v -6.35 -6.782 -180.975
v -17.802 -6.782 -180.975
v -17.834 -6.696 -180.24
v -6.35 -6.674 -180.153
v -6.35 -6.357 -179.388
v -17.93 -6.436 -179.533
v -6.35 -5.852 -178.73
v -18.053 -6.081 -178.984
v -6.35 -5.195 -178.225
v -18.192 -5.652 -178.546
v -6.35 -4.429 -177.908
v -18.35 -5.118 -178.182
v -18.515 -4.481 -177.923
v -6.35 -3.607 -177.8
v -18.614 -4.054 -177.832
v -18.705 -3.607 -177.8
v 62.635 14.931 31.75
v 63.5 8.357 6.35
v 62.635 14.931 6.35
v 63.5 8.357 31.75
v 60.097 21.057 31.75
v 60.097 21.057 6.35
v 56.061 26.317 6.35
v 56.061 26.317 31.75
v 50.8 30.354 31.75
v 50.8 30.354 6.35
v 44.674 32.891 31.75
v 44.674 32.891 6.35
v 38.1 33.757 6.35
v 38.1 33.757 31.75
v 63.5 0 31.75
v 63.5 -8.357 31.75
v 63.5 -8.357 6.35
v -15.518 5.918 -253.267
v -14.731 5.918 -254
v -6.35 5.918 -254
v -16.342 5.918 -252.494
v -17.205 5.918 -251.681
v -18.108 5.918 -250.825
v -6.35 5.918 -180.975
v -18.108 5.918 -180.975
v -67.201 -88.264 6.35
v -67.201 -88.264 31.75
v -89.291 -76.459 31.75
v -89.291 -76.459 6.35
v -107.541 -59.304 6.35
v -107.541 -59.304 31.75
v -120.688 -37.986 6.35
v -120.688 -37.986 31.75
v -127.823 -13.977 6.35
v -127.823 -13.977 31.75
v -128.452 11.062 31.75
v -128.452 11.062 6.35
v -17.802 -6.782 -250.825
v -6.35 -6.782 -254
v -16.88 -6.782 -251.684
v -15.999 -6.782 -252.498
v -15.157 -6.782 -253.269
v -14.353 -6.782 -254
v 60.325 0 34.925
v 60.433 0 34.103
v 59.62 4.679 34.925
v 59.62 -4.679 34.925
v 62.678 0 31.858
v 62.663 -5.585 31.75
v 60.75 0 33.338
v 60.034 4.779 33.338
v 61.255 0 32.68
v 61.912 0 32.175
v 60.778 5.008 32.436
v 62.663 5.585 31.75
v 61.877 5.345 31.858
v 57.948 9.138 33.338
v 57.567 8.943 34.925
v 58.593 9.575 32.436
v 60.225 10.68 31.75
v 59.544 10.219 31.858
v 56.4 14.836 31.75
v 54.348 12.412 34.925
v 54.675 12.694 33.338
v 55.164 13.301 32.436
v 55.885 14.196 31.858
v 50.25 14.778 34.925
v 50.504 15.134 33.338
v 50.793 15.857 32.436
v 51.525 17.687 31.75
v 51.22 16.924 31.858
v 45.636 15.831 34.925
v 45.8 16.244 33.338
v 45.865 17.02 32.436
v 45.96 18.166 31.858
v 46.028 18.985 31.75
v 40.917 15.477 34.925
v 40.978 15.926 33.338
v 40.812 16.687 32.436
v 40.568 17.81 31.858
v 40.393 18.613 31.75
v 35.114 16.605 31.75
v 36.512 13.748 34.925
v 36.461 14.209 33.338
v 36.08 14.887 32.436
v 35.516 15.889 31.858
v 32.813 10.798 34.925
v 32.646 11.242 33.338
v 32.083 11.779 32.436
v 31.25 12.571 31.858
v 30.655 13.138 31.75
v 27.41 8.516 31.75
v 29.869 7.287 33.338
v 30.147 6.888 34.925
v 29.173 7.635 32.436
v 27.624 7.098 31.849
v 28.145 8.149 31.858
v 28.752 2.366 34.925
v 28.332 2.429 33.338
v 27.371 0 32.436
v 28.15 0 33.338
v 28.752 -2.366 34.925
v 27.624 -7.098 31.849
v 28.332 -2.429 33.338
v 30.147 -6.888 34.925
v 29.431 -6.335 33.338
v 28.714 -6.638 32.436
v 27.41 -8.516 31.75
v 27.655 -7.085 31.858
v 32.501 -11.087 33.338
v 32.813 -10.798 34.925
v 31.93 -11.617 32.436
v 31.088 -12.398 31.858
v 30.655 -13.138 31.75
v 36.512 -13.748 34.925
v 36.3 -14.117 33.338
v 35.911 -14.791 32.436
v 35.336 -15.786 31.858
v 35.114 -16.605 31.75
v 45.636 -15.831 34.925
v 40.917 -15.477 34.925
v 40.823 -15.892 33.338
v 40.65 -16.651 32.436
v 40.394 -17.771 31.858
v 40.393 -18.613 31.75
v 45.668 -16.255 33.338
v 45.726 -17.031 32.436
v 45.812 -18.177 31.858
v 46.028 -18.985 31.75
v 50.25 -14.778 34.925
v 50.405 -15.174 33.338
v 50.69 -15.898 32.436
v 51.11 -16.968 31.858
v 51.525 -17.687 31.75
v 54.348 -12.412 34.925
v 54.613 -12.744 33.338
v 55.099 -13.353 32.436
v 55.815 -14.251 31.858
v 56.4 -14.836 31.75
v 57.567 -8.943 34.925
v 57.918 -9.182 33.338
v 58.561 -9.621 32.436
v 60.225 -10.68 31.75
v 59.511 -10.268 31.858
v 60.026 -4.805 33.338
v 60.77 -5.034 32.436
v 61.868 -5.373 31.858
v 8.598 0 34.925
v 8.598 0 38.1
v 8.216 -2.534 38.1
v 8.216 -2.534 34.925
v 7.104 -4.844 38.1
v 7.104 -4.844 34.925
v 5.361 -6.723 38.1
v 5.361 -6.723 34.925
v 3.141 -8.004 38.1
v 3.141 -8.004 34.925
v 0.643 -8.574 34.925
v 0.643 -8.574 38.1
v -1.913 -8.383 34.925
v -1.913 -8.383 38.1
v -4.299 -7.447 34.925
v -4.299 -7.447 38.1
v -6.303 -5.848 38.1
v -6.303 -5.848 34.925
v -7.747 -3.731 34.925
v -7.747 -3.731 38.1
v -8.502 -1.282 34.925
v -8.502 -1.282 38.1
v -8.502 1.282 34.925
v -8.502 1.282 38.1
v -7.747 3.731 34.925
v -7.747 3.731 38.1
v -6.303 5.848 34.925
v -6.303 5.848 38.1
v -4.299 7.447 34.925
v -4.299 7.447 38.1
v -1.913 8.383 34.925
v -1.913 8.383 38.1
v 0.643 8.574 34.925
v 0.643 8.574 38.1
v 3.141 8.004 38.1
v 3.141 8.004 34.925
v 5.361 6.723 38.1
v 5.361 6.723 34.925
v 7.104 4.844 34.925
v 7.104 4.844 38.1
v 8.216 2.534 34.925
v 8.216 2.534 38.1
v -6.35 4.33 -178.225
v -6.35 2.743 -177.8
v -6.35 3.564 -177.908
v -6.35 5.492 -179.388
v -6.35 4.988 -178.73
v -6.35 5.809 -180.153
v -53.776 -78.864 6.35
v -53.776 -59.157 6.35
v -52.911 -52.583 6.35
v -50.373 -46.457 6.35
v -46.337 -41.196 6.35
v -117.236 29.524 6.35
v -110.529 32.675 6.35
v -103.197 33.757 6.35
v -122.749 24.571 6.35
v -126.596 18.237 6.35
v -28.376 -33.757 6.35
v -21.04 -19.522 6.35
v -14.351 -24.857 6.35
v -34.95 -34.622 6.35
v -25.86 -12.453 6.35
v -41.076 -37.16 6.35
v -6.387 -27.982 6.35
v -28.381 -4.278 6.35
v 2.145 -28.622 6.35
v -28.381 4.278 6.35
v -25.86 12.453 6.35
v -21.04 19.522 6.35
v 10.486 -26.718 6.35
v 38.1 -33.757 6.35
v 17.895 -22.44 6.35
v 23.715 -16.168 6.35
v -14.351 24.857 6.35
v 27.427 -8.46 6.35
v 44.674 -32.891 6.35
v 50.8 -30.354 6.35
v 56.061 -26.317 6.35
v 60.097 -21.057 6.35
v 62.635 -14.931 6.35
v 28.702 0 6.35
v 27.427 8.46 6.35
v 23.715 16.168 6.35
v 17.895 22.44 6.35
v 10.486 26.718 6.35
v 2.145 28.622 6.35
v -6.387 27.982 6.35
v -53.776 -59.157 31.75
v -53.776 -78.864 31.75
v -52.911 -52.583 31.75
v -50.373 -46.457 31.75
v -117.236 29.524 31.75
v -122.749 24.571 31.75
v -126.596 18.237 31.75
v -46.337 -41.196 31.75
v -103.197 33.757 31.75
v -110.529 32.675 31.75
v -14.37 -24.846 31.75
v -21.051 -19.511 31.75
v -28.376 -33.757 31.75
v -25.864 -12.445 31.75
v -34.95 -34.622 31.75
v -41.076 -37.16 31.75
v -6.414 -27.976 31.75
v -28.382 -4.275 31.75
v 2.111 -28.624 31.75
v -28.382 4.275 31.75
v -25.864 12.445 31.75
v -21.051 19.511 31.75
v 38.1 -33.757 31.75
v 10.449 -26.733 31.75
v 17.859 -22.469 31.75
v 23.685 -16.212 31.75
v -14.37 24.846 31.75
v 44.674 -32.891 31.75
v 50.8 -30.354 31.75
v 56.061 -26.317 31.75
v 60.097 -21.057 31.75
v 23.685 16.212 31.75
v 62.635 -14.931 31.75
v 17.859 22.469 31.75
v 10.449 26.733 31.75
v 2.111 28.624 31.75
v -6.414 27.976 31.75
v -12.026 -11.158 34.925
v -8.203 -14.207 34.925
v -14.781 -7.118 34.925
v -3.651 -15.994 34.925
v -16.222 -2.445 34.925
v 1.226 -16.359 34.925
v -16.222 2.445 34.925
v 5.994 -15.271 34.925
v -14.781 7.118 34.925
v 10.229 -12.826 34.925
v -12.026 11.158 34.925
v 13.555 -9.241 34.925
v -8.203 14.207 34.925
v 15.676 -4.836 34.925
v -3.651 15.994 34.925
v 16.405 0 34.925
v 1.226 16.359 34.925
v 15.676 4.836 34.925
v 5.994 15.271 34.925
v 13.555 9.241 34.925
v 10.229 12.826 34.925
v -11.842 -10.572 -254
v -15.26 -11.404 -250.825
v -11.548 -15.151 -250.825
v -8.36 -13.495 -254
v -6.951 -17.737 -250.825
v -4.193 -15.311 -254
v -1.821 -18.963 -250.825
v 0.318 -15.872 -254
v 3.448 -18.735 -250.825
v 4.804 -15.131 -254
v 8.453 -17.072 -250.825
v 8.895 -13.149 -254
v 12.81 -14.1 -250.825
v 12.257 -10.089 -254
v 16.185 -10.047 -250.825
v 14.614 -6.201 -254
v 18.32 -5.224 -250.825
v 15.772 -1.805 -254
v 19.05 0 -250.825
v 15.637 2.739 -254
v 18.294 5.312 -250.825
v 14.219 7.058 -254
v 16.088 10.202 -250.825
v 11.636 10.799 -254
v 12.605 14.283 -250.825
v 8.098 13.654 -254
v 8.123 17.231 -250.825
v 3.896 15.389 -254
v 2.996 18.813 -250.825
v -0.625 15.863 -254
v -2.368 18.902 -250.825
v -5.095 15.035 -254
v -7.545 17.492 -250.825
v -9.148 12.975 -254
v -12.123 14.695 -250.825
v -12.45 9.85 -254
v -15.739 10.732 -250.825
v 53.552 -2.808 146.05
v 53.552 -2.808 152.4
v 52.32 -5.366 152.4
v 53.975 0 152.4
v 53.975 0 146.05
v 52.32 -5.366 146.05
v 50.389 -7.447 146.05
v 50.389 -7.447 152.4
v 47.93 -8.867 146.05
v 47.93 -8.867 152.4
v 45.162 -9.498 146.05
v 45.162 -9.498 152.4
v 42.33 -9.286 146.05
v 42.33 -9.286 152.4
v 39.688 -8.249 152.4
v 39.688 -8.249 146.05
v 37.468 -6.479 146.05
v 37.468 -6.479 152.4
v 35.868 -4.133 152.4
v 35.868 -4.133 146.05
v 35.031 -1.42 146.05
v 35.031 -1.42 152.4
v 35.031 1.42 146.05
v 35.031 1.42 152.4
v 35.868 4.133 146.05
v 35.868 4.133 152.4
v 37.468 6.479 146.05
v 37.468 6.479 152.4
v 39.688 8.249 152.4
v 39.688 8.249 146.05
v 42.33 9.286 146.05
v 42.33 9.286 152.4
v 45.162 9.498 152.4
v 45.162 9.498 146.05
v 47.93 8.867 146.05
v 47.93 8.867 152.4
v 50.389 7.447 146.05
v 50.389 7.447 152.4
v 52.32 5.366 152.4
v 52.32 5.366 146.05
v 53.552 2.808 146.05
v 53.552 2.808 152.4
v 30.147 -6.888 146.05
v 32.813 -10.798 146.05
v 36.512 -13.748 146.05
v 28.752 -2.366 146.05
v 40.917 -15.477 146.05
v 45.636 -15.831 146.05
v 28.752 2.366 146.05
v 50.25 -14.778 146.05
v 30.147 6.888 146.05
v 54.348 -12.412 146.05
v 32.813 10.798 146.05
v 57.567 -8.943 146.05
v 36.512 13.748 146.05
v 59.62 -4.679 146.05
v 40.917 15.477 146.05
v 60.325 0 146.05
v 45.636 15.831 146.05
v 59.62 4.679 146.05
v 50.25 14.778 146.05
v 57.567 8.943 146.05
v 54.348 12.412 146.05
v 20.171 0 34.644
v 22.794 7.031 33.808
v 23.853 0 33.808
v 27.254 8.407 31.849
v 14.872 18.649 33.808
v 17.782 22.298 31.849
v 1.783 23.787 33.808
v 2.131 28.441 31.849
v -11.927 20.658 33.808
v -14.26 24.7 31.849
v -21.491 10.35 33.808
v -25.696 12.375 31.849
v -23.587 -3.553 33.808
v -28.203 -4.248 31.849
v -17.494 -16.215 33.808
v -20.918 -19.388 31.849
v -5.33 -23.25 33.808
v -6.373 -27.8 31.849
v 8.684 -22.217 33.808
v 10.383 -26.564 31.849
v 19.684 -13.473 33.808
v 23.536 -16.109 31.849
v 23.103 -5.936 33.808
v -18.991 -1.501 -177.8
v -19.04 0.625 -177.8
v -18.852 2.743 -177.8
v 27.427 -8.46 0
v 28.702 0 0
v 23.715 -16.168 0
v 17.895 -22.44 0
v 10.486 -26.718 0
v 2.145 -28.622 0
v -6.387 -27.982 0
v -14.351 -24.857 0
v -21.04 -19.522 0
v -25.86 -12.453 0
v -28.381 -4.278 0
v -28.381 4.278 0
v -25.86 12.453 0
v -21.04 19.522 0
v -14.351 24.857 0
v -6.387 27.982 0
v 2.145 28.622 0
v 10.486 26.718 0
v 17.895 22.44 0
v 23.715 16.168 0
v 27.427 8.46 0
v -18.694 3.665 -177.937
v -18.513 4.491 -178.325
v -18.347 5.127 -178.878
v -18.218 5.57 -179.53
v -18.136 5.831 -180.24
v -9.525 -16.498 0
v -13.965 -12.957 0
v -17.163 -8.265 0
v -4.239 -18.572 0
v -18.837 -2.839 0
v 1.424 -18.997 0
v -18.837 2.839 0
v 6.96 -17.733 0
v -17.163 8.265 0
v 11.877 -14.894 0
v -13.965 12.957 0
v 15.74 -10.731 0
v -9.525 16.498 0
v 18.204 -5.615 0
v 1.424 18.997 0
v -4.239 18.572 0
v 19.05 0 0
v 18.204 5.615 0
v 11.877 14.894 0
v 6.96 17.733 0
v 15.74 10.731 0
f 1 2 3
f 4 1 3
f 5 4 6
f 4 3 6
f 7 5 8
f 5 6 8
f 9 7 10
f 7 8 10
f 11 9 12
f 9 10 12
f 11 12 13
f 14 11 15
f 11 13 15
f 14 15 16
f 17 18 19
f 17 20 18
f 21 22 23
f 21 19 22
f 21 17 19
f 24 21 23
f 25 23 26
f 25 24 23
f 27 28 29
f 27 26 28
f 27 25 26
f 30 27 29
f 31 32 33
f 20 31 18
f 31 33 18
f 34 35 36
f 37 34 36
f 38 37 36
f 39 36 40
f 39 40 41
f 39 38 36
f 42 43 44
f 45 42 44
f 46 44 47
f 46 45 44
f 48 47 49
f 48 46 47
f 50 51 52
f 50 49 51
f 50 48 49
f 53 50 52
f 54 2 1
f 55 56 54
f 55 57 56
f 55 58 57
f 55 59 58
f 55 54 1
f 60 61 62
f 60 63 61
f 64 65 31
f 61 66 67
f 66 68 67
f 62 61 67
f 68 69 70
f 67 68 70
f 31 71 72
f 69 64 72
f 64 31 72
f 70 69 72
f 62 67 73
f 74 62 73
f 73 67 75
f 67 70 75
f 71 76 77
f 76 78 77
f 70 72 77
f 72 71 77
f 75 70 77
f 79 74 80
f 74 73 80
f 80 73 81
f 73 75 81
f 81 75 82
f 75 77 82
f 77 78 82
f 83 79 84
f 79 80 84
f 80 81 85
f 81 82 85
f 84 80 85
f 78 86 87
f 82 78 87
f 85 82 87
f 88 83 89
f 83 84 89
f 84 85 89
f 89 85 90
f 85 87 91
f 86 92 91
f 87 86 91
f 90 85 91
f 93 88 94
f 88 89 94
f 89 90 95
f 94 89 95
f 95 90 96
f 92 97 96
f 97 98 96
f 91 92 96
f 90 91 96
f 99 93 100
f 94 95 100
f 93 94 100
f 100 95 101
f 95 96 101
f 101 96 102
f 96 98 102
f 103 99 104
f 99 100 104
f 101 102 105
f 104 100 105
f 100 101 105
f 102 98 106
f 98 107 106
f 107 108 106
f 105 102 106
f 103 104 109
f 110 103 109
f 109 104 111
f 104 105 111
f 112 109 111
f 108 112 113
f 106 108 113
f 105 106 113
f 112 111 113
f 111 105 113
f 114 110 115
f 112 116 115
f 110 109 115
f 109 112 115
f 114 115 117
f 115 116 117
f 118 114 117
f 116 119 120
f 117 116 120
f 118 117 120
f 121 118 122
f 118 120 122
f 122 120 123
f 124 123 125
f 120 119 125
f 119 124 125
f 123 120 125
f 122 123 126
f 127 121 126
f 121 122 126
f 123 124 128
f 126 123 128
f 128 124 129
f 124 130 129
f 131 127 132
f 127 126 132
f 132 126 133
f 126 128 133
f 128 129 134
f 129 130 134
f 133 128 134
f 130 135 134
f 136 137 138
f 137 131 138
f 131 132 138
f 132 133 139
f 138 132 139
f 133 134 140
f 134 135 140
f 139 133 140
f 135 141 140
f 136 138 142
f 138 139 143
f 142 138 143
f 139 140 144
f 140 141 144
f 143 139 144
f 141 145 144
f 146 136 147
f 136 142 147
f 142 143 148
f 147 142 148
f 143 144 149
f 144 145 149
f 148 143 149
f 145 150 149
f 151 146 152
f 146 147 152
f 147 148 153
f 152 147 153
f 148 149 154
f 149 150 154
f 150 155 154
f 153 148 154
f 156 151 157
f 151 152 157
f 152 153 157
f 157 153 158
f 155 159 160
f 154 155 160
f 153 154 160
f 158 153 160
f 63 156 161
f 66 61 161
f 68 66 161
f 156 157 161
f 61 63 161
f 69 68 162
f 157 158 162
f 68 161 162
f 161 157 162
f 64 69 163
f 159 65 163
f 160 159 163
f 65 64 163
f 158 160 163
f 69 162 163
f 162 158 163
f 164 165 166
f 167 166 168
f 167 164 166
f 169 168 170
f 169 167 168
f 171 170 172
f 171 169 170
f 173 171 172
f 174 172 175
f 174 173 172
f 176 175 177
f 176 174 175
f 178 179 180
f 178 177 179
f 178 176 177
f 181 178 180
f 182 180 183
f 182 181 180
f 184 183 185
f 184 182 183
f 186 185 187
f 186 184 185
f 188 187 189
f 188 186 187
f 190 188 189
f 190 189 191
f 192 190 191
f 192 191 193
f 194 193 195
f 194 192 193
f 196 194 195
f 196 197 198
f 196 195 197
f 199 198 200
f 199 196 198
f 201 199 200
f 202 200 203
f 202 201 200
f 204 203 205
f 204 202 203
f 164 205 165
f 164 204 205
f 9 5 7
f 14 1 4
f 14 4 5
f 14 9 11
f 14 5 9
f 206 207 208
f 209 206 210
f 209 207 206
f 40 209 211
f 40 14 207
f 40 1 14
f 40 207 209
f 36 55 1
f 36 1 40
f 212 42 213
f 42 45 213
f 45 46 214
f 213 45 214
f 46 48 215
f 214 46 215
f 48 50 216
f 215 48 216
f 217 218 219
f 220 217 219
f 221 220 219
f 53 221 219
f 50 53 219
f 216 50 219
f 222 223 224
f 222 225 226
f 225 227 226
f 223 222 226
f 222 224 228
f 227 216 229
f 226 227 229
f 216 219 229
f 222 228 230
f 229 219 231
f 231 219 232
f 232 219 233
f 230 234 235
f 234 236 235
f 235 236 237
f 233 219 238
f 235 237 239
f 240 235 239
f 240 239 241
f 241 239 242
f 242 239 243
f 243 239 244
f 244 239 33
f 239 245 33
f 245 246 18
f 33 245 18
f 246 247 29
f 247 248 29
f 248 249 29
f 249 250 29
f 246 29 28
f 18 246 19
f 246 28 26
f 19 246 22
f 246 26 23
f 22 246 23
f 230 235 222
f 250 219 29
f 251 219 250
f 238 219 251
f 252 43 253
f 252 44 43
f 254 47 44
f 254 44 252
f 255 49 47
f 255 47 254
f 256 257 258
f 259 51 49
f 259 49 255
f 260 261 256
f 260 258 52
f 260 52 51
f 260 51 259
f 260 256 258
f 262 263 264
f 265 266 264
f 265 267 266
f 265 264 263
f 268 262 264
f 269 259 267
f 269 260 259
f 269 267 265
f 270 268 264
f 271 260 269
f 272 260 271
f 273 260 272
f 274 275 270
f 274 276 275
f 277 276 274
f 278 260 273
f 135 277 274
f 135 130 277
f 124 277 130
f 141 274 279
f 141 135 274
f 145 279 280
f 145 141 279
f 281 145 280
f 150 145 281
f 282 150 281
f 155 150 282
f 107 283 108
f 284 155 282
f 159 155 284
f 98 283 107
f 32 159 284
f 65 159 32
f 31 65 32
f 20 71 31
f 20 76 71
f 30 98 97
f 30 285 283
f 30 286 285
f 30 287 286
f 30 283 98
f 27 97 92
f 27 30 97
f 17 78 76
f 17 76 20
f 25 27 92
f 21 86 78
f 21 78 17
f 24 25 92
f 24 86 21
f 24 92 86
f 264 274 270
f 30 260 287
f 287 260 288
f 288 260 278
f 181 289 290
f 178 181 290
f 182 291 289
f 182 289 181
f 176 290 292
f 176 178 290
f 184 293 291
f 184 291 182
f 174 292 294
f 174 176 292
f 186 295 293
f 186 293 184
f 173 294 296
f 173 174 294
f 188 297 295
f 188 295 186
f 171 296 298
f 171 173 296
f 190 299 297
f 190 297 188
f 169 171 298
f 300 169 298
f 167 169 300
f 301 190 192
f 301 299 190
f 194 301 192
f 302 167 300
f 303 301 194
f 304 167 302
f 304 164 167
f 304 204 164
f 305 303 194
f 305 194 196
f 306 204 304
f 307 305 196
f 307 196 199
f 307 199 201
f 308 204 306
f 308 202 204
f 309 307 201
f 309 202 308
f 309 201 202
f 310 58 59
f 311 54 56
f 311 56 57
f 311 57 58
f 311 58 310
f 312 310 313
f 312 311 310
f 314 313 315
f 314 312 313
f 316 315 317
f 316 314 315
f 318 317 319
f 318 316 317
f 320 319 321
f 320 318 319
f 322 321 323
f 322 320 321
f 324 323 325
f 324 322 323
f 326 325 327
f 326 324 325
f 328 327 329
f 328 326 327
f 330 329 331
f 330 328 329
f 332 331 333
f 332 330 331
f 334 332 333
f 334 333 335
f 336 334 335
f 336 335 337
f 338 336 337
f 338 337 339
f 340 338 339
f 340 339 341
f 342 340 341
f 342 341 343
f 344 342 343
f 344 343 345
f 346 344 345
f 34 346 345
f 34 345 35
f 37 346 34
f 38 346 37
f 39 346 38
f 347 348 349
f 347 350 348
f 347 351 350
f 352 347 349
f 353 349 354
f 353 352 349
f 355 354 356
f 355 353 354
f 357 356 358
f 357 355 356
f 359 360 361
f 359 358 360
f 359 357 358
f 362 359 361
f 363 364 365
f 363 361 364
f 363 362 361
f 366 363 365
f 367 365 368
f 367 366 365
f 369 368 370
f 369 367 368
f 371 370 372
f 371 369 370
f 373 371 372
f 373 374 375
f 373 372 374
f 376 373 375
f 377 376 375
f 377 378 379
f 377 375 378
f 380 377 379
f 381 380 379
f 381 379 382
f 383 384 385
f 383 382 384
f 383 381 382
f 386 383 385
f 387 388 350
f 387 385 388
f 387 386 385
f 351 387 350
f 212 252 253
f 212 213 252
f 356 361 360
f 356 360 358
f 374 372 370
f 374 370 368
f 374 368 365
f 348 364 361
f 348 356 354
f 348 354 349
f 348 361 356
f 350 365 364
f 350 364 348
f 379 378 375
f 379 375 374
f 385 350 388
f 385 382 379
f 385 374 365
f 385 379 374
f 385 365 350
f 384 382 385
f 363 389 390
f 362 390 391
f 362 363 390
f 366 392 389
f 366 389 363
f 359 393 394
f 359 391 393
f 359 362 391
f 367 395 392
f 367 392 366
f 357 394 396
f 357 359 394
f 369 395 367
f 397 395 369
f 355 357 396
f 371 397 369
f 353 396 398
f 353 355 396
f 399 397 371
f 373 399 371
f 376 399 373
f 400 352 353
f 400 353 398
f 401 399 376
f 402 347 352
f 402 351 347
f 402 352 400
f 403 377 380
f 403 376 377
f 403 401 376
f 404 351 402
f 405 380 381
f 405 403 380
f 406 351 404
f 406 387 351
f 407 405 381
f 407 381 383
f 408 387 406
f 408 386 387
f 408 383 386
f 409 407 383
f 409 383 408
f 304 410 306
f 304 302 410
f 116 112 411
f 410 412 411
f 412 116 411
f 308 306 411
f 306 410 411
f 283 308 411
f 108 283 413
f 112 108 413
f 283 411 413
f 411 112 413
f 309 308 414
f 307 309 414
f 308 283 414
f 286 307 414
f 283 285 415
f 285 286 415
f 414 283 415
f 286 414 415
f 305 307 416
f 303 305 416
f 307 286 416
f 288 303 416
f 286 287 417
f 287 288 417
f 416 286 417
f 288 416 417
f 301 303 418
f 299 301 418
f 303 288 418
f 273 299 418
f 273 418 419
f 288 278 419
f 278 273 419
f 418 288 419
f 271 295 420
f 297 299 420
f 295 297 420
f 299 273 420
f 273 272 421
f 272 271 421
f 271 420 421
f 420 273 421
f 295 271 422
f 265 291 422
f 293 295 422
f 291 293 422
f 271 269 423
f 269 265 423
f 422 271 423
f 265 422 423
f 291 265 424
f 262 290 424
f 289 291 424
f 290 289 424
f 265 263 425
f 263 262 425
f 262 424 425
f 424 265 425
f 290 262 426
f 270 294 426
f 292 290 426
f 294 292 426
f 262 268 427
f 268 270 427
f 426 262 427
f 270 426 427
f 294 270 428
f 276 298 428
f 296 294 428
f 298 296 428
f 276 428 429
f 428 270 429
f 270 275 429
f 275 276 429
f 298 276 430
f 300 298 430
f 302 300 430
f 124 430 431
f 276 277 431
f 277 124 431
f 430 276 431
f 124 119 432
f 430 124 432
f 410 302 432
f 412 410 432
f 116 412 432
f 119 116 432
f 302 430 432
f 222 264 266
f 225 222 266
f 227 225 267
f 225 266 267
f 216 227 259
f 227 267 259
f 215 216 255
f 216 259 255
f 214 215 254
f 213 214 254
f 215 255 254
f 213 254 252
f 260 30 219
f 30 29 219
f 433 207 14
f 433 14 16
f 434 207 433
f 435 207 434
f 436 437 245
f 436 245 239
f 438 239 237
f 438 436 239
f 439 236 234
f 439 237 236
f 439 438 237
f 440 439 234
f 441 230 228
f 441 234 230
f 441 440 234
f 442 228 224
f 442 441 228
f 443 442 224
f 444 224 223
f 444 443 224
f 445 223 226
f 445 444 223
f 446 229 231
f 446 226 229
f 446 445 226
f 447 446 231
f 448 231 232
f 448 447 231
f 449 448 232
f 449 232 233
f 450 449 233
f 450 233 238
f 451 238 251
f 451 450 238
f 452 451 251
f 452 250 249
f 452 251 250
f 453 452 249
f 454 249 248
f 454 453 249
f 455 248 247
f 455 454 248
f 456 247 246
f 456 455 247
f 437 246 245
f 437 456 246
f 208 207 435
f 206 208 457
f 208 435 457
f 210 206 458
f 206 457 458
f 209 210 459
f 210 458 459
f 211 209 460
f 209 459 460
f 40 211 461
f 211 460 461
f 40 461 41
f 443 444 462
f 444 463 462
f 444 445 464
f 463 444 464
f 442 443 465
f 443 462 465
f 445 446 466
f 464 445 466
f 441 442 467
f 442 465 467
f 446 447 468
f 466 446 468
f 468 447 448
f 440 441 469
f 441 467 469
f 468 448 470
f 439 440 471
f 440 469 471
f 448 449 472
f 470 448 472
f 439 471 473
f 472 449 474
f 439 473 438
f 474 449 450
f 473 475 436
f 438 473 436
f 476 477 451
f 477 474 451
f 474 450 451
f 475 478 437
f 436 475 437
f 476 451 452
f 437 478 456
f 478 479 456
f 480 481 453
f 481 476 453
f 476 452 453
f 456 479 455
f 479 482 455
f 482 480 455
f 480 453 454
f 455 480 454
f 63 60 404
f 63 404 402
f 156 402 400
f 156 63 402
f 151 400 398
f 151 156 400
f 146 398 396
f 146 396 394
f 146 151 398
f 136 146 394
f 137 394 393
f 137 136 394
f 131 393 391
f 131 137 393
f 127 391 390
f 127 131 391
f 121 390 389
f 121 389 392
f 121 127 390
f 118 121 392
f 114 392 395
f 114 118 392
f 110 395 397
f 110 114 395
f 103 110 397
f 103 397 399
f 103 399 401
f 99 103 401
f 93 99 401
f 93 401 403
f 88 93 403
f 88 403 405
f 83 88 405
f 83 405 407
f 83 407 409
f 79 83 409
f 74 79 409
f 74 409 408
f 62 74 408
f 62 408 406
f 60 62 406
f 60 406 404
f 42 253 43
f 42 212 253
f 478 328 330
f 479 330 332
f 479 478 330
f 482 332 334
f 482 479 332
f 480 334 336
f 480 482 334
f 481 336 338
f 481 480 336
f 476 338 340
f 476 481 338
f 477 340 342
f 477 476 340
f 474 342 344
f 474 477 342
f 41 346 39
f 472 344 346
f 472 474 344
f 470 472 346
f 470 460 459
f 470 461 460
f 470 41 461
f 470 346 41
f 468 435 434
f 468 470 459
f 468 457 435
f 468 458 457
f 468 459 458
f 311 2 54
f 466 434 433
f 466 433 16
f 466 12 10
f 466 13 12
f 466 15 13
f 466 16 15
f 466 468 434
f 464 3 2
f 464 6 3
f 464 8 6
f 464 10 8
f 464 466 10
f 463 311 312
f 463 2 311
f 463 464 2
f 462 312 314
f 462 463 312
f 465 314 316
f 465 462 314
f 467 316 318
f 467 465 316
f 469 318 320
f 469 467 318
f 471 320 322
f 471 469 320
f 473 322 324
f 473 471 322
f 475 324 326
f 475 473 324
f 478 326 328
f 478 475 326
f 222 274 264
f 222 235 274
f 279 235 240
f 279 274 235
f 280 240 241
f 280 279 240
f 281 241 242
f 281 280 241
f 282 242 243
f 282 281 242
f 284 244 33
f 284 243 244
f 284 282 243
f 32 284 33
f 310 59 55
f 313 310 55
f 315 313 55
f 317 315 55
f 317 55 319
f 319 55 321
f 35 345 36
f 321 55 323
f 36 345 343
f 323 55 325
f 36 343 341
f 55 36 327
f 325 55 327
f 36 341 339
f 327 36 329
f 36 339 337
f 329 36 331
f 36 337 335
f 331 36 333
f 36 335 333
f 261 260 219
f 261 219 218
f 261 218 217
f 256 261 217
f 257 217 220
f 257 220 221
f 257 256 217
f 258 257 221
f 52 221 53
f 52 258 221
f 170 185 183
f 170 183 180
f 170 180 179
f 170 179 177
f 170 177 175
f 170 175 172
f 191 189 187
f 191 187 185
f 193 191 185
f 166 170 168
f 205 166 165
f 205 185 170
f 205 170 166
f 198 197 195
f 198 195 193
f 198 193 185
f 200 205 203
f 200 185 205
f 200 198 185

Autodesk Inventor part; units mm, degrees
ref_plane "YZ Plane" through (0, 0, 0) normal (1, 0, 0) x (0, 1, 0)
ref_plane "XZ Plane" through (0, 0, 0) normal (0, 1, 0) x (-1, 0, 0)
ref_plane "XY Plane" through (0, 0, 0) normal (0, 0, 1) x (1, 0, 0)
sketch "Sketch1" plane through (0, 0, 0) normal (0, 0, 1) x (1, 0, 0)
  circle A0 centre (0, 0) radius 19.05
  circle A1 centre (0, 0) radius 28.702
  dimension "d1" = 9.652
  dimension "d38" = 38.1
extrude "Extrusion1" add sketch "Sketch1" against normal blind 254 contours A0
extrude "Extrusion2" add sketch "Sketch1" along normal blind 6.35 contours A0 | A1
chamfer "Chamfer1" distance 3.175 angle 45 1 edges at (-19.05, 0, -254)
sketch "Sketch2" plane through (0, 0, 6.35) normal (0, 0, 1) x (1, 0, 0)
  circle A0 centre (0, 0) radius 28.702 projected
  circle A1 centre (0, 0) radius 33.7566
  arc A2 (-68.8892, 89.446) -> (-67.2009, -88.2638) centre (-33.7441, 0.9169) ccw
  line L0 (-53.7761, -78.8636) -> (-67.2009, -88.2638)
  line L1 (0, -33.7566) -> (0, 33.7566)
  line L2 (-53.7761, 78.8636) -> (-53.7761, -78.8636)
  line L3 (-53.7761, 78.8636) -> (-68.8892, 89.446)
  line L4 (63.5, 33.7566) -> (-53.7761, 33.7566)
  line L5 (0, 0) -> (-53.7761, 0)
  line L6 (-146.05, 0) -> (-154.4505, 0)
  line L7 (63.5, -33.7566) -> (-53.7761, -33.7566)
  line L8 (0, 0) -> (63.5, 0)
  line L9 (63.5, 0) -> (63.5, -33.7566)
  line L10 (63.5, 0) -> (63.5, 33.7566)
  line L11 (-53.7761, 33.7566) -> (-123.154, 33.7566)
  line L12 (-53.7761, 0) -> (-128.9897, 0)
  line L13 (-53.7761, -33.7566) -> (-122.4589, -33.7566)
  dimension "d8" = 125
  dimension "d10" = 190.5
  dimension "d17" = 63.5
extrude "Extrusion10" add sketch "Sketch2" along normal blind 25.4 contours L8 L1 A0 | L8 A1 L1 A0 | A0 L1 L8 | A0 L1 A1 L8 | L1 L5 A0 | A0 L5 A1 L1 | L1 A1 L5 A0 | A0 L5 L1 | L8 L9 L7 A1 | A1 L4 L10 L8 | A1 L5 L2 L4 | L7 L2 L5 A1 | L2 L12 A2 L11 | L13 A2 L12 L2 | L2 L0 A2 L13
fillet "Fillet1" radius 25.4 4 edges at (-53.7761, -33.7566, 19.05) (63.5, -33.7566, 19.05) (63.5, 33.7566, 19.05) (-123.154, 33.7566, 19.05)
sketch "Sketch3" plane through (0, 0, 31.75) normal (0, 0, 1) x (1, 0, 0)
  circle A0 centre (0, 0) radius 28.702
  circle A1 centre (0, 0) radius 8.5985
  arc A2 (-103.1968, 33.7566) -> (-128.4523, 11.0619) centre (-103.1968, 8.3566) ccw projected
  arc A3 (-128.4523, 11.0619) -> (-67.2009, -88.2638) centre (-33.7441, 0.9169) ccw projected
  line L0 (-53.7761, -78.8636) -> (-67.2009, -88.2638) projected
  line L1 (-53.7761, -59.1566) -> (-53.7761, -78.8636) projected
  arc A4 (-28.3761, -33.7566) -> (-53.7761, -59.1566) centre (-28.3761, -59.1566) ccw projected
  line L2 (38.1, -33.7566) -> (-28.3761, -33.7566) projected
  arc A5 (38.1, -33.7566) -> (63.5, -8.3566) centre (38.1, -8.3566) ccw projected
  line L3 (63.5, 8.3566) -> (63.5, -8.3566) projected
  arc A6 (63.5, 8.3566) -> (38.1, 33.7566) centre (38.1, 8.3566) ccw projected
  line L4 (-103.1968, 33.7566) -> (38.1, 33.7566) projected
extrude "Extrusion5" add sketch "Sketch3" along normal blind 3.175 contours A0 | A1
extrude "Extrusion6" add sketch "Sketch3" along normal blind 6.35 contours A1
fillet "Fillet2" radius 25.4 1 edges at (-28.702, 0, 34.925)
sketch "Sketch4" plane through (0, 0, 31.75) normal (0, 0, 1) x (1, 0, 0)
  line L0 (63.5, 8.3566) -> (63.5, -8.3566)
  circle A0 centre (44.45, 0) radius 15.875
  circle A1 centre (44.45, 0) radius 9.525
  arc A2 (-28.702, 0) -> (28.702, 0) centre (0, 0) ccw projected
  arc A3 (28.702, 0) -> (-28.702, 0) centre (0, 0) ccw projected
  arc A4 (-103.1968, 33.7566) -> (-128.4523, 11.0619) centre (-103.1968, 8.3566) ccw projected
  arc A5 (-128.4523, 11.0619) -> (-67.2009, -88.2638) centre (-33.7441, 0.9169) ccw projected
  line L1 (-53.7761, -78.8636) -> (-67.2009, -88.2638) projected
  line L2 (-53.7761, -59.1566) -> (-53.7761, -78.8636) projected
  arc A6 (-28.3761, -33.7566) -> (-53.7761, -59.1566) centre (-28.3761, -59.1566) ccw projected
  line L3 (38.1, -33.7566) -> (-28.3761, -33.7566) projected
  arc A7 (38.1, -33.7566) -> (63.5, -8.3566) centre (38.1, -8.3566) ccw projected
  line L4 (63.5, 8.3566) -> (63.5, -8.3566) projected
  arc A8 (63.5, 8.3566) -> (38.1, 33.7566) centre (38.1, 8.3566) ccw projected
  line L5 (-103.1968, 33.7566) -> (38.1, 33.7566) projected
  dimension "d24" = 19.05
  dimension "d25" = 31.75
  dimension "d26" = 19.05
extrude "Extrusion7" add sketch "Sketch4" along normal blind 120.65 contours A1
extrude "Extrusion8" add sketch "Sketch4" along normal blind 114.3 contours A0 A2 A3 | A3 A2 A0 picked at (58.0643, -1.2262) picked at (28.6234, 0)
fillet "Fillet3" radius 3.175 2 edges at (45.2559, 15.8545, 31.75) (45.2559, -15.8545, 31.75)
sketch "Sketch5" plane through (0, 0, -254) normal (0, 0, -1) x (-1, 0, 0)
  circle A0 centre (0, 0) radius 15.875 projected
  line L0 (6.35, 5.9176) -> (31.75, 5.9176)
  line L1 (31.75, 5.9176) -> (31.75, -6.7824)
  line L2 (31.75, -6.7824) -> (6.35, -6.7824)
  line L3 (6.35, -6.7824) -> (6.35, 5.9176)
  dimension "d32" = 12.7
  dimension "d33" = 25.4
  dimension "d34" = 6.35
extrude "Extrusion9" cut sketch "Sketch5" against normal blind 76.2 contours A0 L2 L3 L0 | A0 L0 L1 L2 picked at (9.525, -0.2883)
fillet "Fillet4" radius 3.175 2 edges at (-12.0759, -6.7824, -177.8) (-12.2288, 5.9176, -177.8)
equation "\"d9\" = d8"
equation "\"d12\" = d11"
equation "\"d11\" = 31.75"
properties part number "Crankshaft" material "Steel, High Strength Low Alloy"
